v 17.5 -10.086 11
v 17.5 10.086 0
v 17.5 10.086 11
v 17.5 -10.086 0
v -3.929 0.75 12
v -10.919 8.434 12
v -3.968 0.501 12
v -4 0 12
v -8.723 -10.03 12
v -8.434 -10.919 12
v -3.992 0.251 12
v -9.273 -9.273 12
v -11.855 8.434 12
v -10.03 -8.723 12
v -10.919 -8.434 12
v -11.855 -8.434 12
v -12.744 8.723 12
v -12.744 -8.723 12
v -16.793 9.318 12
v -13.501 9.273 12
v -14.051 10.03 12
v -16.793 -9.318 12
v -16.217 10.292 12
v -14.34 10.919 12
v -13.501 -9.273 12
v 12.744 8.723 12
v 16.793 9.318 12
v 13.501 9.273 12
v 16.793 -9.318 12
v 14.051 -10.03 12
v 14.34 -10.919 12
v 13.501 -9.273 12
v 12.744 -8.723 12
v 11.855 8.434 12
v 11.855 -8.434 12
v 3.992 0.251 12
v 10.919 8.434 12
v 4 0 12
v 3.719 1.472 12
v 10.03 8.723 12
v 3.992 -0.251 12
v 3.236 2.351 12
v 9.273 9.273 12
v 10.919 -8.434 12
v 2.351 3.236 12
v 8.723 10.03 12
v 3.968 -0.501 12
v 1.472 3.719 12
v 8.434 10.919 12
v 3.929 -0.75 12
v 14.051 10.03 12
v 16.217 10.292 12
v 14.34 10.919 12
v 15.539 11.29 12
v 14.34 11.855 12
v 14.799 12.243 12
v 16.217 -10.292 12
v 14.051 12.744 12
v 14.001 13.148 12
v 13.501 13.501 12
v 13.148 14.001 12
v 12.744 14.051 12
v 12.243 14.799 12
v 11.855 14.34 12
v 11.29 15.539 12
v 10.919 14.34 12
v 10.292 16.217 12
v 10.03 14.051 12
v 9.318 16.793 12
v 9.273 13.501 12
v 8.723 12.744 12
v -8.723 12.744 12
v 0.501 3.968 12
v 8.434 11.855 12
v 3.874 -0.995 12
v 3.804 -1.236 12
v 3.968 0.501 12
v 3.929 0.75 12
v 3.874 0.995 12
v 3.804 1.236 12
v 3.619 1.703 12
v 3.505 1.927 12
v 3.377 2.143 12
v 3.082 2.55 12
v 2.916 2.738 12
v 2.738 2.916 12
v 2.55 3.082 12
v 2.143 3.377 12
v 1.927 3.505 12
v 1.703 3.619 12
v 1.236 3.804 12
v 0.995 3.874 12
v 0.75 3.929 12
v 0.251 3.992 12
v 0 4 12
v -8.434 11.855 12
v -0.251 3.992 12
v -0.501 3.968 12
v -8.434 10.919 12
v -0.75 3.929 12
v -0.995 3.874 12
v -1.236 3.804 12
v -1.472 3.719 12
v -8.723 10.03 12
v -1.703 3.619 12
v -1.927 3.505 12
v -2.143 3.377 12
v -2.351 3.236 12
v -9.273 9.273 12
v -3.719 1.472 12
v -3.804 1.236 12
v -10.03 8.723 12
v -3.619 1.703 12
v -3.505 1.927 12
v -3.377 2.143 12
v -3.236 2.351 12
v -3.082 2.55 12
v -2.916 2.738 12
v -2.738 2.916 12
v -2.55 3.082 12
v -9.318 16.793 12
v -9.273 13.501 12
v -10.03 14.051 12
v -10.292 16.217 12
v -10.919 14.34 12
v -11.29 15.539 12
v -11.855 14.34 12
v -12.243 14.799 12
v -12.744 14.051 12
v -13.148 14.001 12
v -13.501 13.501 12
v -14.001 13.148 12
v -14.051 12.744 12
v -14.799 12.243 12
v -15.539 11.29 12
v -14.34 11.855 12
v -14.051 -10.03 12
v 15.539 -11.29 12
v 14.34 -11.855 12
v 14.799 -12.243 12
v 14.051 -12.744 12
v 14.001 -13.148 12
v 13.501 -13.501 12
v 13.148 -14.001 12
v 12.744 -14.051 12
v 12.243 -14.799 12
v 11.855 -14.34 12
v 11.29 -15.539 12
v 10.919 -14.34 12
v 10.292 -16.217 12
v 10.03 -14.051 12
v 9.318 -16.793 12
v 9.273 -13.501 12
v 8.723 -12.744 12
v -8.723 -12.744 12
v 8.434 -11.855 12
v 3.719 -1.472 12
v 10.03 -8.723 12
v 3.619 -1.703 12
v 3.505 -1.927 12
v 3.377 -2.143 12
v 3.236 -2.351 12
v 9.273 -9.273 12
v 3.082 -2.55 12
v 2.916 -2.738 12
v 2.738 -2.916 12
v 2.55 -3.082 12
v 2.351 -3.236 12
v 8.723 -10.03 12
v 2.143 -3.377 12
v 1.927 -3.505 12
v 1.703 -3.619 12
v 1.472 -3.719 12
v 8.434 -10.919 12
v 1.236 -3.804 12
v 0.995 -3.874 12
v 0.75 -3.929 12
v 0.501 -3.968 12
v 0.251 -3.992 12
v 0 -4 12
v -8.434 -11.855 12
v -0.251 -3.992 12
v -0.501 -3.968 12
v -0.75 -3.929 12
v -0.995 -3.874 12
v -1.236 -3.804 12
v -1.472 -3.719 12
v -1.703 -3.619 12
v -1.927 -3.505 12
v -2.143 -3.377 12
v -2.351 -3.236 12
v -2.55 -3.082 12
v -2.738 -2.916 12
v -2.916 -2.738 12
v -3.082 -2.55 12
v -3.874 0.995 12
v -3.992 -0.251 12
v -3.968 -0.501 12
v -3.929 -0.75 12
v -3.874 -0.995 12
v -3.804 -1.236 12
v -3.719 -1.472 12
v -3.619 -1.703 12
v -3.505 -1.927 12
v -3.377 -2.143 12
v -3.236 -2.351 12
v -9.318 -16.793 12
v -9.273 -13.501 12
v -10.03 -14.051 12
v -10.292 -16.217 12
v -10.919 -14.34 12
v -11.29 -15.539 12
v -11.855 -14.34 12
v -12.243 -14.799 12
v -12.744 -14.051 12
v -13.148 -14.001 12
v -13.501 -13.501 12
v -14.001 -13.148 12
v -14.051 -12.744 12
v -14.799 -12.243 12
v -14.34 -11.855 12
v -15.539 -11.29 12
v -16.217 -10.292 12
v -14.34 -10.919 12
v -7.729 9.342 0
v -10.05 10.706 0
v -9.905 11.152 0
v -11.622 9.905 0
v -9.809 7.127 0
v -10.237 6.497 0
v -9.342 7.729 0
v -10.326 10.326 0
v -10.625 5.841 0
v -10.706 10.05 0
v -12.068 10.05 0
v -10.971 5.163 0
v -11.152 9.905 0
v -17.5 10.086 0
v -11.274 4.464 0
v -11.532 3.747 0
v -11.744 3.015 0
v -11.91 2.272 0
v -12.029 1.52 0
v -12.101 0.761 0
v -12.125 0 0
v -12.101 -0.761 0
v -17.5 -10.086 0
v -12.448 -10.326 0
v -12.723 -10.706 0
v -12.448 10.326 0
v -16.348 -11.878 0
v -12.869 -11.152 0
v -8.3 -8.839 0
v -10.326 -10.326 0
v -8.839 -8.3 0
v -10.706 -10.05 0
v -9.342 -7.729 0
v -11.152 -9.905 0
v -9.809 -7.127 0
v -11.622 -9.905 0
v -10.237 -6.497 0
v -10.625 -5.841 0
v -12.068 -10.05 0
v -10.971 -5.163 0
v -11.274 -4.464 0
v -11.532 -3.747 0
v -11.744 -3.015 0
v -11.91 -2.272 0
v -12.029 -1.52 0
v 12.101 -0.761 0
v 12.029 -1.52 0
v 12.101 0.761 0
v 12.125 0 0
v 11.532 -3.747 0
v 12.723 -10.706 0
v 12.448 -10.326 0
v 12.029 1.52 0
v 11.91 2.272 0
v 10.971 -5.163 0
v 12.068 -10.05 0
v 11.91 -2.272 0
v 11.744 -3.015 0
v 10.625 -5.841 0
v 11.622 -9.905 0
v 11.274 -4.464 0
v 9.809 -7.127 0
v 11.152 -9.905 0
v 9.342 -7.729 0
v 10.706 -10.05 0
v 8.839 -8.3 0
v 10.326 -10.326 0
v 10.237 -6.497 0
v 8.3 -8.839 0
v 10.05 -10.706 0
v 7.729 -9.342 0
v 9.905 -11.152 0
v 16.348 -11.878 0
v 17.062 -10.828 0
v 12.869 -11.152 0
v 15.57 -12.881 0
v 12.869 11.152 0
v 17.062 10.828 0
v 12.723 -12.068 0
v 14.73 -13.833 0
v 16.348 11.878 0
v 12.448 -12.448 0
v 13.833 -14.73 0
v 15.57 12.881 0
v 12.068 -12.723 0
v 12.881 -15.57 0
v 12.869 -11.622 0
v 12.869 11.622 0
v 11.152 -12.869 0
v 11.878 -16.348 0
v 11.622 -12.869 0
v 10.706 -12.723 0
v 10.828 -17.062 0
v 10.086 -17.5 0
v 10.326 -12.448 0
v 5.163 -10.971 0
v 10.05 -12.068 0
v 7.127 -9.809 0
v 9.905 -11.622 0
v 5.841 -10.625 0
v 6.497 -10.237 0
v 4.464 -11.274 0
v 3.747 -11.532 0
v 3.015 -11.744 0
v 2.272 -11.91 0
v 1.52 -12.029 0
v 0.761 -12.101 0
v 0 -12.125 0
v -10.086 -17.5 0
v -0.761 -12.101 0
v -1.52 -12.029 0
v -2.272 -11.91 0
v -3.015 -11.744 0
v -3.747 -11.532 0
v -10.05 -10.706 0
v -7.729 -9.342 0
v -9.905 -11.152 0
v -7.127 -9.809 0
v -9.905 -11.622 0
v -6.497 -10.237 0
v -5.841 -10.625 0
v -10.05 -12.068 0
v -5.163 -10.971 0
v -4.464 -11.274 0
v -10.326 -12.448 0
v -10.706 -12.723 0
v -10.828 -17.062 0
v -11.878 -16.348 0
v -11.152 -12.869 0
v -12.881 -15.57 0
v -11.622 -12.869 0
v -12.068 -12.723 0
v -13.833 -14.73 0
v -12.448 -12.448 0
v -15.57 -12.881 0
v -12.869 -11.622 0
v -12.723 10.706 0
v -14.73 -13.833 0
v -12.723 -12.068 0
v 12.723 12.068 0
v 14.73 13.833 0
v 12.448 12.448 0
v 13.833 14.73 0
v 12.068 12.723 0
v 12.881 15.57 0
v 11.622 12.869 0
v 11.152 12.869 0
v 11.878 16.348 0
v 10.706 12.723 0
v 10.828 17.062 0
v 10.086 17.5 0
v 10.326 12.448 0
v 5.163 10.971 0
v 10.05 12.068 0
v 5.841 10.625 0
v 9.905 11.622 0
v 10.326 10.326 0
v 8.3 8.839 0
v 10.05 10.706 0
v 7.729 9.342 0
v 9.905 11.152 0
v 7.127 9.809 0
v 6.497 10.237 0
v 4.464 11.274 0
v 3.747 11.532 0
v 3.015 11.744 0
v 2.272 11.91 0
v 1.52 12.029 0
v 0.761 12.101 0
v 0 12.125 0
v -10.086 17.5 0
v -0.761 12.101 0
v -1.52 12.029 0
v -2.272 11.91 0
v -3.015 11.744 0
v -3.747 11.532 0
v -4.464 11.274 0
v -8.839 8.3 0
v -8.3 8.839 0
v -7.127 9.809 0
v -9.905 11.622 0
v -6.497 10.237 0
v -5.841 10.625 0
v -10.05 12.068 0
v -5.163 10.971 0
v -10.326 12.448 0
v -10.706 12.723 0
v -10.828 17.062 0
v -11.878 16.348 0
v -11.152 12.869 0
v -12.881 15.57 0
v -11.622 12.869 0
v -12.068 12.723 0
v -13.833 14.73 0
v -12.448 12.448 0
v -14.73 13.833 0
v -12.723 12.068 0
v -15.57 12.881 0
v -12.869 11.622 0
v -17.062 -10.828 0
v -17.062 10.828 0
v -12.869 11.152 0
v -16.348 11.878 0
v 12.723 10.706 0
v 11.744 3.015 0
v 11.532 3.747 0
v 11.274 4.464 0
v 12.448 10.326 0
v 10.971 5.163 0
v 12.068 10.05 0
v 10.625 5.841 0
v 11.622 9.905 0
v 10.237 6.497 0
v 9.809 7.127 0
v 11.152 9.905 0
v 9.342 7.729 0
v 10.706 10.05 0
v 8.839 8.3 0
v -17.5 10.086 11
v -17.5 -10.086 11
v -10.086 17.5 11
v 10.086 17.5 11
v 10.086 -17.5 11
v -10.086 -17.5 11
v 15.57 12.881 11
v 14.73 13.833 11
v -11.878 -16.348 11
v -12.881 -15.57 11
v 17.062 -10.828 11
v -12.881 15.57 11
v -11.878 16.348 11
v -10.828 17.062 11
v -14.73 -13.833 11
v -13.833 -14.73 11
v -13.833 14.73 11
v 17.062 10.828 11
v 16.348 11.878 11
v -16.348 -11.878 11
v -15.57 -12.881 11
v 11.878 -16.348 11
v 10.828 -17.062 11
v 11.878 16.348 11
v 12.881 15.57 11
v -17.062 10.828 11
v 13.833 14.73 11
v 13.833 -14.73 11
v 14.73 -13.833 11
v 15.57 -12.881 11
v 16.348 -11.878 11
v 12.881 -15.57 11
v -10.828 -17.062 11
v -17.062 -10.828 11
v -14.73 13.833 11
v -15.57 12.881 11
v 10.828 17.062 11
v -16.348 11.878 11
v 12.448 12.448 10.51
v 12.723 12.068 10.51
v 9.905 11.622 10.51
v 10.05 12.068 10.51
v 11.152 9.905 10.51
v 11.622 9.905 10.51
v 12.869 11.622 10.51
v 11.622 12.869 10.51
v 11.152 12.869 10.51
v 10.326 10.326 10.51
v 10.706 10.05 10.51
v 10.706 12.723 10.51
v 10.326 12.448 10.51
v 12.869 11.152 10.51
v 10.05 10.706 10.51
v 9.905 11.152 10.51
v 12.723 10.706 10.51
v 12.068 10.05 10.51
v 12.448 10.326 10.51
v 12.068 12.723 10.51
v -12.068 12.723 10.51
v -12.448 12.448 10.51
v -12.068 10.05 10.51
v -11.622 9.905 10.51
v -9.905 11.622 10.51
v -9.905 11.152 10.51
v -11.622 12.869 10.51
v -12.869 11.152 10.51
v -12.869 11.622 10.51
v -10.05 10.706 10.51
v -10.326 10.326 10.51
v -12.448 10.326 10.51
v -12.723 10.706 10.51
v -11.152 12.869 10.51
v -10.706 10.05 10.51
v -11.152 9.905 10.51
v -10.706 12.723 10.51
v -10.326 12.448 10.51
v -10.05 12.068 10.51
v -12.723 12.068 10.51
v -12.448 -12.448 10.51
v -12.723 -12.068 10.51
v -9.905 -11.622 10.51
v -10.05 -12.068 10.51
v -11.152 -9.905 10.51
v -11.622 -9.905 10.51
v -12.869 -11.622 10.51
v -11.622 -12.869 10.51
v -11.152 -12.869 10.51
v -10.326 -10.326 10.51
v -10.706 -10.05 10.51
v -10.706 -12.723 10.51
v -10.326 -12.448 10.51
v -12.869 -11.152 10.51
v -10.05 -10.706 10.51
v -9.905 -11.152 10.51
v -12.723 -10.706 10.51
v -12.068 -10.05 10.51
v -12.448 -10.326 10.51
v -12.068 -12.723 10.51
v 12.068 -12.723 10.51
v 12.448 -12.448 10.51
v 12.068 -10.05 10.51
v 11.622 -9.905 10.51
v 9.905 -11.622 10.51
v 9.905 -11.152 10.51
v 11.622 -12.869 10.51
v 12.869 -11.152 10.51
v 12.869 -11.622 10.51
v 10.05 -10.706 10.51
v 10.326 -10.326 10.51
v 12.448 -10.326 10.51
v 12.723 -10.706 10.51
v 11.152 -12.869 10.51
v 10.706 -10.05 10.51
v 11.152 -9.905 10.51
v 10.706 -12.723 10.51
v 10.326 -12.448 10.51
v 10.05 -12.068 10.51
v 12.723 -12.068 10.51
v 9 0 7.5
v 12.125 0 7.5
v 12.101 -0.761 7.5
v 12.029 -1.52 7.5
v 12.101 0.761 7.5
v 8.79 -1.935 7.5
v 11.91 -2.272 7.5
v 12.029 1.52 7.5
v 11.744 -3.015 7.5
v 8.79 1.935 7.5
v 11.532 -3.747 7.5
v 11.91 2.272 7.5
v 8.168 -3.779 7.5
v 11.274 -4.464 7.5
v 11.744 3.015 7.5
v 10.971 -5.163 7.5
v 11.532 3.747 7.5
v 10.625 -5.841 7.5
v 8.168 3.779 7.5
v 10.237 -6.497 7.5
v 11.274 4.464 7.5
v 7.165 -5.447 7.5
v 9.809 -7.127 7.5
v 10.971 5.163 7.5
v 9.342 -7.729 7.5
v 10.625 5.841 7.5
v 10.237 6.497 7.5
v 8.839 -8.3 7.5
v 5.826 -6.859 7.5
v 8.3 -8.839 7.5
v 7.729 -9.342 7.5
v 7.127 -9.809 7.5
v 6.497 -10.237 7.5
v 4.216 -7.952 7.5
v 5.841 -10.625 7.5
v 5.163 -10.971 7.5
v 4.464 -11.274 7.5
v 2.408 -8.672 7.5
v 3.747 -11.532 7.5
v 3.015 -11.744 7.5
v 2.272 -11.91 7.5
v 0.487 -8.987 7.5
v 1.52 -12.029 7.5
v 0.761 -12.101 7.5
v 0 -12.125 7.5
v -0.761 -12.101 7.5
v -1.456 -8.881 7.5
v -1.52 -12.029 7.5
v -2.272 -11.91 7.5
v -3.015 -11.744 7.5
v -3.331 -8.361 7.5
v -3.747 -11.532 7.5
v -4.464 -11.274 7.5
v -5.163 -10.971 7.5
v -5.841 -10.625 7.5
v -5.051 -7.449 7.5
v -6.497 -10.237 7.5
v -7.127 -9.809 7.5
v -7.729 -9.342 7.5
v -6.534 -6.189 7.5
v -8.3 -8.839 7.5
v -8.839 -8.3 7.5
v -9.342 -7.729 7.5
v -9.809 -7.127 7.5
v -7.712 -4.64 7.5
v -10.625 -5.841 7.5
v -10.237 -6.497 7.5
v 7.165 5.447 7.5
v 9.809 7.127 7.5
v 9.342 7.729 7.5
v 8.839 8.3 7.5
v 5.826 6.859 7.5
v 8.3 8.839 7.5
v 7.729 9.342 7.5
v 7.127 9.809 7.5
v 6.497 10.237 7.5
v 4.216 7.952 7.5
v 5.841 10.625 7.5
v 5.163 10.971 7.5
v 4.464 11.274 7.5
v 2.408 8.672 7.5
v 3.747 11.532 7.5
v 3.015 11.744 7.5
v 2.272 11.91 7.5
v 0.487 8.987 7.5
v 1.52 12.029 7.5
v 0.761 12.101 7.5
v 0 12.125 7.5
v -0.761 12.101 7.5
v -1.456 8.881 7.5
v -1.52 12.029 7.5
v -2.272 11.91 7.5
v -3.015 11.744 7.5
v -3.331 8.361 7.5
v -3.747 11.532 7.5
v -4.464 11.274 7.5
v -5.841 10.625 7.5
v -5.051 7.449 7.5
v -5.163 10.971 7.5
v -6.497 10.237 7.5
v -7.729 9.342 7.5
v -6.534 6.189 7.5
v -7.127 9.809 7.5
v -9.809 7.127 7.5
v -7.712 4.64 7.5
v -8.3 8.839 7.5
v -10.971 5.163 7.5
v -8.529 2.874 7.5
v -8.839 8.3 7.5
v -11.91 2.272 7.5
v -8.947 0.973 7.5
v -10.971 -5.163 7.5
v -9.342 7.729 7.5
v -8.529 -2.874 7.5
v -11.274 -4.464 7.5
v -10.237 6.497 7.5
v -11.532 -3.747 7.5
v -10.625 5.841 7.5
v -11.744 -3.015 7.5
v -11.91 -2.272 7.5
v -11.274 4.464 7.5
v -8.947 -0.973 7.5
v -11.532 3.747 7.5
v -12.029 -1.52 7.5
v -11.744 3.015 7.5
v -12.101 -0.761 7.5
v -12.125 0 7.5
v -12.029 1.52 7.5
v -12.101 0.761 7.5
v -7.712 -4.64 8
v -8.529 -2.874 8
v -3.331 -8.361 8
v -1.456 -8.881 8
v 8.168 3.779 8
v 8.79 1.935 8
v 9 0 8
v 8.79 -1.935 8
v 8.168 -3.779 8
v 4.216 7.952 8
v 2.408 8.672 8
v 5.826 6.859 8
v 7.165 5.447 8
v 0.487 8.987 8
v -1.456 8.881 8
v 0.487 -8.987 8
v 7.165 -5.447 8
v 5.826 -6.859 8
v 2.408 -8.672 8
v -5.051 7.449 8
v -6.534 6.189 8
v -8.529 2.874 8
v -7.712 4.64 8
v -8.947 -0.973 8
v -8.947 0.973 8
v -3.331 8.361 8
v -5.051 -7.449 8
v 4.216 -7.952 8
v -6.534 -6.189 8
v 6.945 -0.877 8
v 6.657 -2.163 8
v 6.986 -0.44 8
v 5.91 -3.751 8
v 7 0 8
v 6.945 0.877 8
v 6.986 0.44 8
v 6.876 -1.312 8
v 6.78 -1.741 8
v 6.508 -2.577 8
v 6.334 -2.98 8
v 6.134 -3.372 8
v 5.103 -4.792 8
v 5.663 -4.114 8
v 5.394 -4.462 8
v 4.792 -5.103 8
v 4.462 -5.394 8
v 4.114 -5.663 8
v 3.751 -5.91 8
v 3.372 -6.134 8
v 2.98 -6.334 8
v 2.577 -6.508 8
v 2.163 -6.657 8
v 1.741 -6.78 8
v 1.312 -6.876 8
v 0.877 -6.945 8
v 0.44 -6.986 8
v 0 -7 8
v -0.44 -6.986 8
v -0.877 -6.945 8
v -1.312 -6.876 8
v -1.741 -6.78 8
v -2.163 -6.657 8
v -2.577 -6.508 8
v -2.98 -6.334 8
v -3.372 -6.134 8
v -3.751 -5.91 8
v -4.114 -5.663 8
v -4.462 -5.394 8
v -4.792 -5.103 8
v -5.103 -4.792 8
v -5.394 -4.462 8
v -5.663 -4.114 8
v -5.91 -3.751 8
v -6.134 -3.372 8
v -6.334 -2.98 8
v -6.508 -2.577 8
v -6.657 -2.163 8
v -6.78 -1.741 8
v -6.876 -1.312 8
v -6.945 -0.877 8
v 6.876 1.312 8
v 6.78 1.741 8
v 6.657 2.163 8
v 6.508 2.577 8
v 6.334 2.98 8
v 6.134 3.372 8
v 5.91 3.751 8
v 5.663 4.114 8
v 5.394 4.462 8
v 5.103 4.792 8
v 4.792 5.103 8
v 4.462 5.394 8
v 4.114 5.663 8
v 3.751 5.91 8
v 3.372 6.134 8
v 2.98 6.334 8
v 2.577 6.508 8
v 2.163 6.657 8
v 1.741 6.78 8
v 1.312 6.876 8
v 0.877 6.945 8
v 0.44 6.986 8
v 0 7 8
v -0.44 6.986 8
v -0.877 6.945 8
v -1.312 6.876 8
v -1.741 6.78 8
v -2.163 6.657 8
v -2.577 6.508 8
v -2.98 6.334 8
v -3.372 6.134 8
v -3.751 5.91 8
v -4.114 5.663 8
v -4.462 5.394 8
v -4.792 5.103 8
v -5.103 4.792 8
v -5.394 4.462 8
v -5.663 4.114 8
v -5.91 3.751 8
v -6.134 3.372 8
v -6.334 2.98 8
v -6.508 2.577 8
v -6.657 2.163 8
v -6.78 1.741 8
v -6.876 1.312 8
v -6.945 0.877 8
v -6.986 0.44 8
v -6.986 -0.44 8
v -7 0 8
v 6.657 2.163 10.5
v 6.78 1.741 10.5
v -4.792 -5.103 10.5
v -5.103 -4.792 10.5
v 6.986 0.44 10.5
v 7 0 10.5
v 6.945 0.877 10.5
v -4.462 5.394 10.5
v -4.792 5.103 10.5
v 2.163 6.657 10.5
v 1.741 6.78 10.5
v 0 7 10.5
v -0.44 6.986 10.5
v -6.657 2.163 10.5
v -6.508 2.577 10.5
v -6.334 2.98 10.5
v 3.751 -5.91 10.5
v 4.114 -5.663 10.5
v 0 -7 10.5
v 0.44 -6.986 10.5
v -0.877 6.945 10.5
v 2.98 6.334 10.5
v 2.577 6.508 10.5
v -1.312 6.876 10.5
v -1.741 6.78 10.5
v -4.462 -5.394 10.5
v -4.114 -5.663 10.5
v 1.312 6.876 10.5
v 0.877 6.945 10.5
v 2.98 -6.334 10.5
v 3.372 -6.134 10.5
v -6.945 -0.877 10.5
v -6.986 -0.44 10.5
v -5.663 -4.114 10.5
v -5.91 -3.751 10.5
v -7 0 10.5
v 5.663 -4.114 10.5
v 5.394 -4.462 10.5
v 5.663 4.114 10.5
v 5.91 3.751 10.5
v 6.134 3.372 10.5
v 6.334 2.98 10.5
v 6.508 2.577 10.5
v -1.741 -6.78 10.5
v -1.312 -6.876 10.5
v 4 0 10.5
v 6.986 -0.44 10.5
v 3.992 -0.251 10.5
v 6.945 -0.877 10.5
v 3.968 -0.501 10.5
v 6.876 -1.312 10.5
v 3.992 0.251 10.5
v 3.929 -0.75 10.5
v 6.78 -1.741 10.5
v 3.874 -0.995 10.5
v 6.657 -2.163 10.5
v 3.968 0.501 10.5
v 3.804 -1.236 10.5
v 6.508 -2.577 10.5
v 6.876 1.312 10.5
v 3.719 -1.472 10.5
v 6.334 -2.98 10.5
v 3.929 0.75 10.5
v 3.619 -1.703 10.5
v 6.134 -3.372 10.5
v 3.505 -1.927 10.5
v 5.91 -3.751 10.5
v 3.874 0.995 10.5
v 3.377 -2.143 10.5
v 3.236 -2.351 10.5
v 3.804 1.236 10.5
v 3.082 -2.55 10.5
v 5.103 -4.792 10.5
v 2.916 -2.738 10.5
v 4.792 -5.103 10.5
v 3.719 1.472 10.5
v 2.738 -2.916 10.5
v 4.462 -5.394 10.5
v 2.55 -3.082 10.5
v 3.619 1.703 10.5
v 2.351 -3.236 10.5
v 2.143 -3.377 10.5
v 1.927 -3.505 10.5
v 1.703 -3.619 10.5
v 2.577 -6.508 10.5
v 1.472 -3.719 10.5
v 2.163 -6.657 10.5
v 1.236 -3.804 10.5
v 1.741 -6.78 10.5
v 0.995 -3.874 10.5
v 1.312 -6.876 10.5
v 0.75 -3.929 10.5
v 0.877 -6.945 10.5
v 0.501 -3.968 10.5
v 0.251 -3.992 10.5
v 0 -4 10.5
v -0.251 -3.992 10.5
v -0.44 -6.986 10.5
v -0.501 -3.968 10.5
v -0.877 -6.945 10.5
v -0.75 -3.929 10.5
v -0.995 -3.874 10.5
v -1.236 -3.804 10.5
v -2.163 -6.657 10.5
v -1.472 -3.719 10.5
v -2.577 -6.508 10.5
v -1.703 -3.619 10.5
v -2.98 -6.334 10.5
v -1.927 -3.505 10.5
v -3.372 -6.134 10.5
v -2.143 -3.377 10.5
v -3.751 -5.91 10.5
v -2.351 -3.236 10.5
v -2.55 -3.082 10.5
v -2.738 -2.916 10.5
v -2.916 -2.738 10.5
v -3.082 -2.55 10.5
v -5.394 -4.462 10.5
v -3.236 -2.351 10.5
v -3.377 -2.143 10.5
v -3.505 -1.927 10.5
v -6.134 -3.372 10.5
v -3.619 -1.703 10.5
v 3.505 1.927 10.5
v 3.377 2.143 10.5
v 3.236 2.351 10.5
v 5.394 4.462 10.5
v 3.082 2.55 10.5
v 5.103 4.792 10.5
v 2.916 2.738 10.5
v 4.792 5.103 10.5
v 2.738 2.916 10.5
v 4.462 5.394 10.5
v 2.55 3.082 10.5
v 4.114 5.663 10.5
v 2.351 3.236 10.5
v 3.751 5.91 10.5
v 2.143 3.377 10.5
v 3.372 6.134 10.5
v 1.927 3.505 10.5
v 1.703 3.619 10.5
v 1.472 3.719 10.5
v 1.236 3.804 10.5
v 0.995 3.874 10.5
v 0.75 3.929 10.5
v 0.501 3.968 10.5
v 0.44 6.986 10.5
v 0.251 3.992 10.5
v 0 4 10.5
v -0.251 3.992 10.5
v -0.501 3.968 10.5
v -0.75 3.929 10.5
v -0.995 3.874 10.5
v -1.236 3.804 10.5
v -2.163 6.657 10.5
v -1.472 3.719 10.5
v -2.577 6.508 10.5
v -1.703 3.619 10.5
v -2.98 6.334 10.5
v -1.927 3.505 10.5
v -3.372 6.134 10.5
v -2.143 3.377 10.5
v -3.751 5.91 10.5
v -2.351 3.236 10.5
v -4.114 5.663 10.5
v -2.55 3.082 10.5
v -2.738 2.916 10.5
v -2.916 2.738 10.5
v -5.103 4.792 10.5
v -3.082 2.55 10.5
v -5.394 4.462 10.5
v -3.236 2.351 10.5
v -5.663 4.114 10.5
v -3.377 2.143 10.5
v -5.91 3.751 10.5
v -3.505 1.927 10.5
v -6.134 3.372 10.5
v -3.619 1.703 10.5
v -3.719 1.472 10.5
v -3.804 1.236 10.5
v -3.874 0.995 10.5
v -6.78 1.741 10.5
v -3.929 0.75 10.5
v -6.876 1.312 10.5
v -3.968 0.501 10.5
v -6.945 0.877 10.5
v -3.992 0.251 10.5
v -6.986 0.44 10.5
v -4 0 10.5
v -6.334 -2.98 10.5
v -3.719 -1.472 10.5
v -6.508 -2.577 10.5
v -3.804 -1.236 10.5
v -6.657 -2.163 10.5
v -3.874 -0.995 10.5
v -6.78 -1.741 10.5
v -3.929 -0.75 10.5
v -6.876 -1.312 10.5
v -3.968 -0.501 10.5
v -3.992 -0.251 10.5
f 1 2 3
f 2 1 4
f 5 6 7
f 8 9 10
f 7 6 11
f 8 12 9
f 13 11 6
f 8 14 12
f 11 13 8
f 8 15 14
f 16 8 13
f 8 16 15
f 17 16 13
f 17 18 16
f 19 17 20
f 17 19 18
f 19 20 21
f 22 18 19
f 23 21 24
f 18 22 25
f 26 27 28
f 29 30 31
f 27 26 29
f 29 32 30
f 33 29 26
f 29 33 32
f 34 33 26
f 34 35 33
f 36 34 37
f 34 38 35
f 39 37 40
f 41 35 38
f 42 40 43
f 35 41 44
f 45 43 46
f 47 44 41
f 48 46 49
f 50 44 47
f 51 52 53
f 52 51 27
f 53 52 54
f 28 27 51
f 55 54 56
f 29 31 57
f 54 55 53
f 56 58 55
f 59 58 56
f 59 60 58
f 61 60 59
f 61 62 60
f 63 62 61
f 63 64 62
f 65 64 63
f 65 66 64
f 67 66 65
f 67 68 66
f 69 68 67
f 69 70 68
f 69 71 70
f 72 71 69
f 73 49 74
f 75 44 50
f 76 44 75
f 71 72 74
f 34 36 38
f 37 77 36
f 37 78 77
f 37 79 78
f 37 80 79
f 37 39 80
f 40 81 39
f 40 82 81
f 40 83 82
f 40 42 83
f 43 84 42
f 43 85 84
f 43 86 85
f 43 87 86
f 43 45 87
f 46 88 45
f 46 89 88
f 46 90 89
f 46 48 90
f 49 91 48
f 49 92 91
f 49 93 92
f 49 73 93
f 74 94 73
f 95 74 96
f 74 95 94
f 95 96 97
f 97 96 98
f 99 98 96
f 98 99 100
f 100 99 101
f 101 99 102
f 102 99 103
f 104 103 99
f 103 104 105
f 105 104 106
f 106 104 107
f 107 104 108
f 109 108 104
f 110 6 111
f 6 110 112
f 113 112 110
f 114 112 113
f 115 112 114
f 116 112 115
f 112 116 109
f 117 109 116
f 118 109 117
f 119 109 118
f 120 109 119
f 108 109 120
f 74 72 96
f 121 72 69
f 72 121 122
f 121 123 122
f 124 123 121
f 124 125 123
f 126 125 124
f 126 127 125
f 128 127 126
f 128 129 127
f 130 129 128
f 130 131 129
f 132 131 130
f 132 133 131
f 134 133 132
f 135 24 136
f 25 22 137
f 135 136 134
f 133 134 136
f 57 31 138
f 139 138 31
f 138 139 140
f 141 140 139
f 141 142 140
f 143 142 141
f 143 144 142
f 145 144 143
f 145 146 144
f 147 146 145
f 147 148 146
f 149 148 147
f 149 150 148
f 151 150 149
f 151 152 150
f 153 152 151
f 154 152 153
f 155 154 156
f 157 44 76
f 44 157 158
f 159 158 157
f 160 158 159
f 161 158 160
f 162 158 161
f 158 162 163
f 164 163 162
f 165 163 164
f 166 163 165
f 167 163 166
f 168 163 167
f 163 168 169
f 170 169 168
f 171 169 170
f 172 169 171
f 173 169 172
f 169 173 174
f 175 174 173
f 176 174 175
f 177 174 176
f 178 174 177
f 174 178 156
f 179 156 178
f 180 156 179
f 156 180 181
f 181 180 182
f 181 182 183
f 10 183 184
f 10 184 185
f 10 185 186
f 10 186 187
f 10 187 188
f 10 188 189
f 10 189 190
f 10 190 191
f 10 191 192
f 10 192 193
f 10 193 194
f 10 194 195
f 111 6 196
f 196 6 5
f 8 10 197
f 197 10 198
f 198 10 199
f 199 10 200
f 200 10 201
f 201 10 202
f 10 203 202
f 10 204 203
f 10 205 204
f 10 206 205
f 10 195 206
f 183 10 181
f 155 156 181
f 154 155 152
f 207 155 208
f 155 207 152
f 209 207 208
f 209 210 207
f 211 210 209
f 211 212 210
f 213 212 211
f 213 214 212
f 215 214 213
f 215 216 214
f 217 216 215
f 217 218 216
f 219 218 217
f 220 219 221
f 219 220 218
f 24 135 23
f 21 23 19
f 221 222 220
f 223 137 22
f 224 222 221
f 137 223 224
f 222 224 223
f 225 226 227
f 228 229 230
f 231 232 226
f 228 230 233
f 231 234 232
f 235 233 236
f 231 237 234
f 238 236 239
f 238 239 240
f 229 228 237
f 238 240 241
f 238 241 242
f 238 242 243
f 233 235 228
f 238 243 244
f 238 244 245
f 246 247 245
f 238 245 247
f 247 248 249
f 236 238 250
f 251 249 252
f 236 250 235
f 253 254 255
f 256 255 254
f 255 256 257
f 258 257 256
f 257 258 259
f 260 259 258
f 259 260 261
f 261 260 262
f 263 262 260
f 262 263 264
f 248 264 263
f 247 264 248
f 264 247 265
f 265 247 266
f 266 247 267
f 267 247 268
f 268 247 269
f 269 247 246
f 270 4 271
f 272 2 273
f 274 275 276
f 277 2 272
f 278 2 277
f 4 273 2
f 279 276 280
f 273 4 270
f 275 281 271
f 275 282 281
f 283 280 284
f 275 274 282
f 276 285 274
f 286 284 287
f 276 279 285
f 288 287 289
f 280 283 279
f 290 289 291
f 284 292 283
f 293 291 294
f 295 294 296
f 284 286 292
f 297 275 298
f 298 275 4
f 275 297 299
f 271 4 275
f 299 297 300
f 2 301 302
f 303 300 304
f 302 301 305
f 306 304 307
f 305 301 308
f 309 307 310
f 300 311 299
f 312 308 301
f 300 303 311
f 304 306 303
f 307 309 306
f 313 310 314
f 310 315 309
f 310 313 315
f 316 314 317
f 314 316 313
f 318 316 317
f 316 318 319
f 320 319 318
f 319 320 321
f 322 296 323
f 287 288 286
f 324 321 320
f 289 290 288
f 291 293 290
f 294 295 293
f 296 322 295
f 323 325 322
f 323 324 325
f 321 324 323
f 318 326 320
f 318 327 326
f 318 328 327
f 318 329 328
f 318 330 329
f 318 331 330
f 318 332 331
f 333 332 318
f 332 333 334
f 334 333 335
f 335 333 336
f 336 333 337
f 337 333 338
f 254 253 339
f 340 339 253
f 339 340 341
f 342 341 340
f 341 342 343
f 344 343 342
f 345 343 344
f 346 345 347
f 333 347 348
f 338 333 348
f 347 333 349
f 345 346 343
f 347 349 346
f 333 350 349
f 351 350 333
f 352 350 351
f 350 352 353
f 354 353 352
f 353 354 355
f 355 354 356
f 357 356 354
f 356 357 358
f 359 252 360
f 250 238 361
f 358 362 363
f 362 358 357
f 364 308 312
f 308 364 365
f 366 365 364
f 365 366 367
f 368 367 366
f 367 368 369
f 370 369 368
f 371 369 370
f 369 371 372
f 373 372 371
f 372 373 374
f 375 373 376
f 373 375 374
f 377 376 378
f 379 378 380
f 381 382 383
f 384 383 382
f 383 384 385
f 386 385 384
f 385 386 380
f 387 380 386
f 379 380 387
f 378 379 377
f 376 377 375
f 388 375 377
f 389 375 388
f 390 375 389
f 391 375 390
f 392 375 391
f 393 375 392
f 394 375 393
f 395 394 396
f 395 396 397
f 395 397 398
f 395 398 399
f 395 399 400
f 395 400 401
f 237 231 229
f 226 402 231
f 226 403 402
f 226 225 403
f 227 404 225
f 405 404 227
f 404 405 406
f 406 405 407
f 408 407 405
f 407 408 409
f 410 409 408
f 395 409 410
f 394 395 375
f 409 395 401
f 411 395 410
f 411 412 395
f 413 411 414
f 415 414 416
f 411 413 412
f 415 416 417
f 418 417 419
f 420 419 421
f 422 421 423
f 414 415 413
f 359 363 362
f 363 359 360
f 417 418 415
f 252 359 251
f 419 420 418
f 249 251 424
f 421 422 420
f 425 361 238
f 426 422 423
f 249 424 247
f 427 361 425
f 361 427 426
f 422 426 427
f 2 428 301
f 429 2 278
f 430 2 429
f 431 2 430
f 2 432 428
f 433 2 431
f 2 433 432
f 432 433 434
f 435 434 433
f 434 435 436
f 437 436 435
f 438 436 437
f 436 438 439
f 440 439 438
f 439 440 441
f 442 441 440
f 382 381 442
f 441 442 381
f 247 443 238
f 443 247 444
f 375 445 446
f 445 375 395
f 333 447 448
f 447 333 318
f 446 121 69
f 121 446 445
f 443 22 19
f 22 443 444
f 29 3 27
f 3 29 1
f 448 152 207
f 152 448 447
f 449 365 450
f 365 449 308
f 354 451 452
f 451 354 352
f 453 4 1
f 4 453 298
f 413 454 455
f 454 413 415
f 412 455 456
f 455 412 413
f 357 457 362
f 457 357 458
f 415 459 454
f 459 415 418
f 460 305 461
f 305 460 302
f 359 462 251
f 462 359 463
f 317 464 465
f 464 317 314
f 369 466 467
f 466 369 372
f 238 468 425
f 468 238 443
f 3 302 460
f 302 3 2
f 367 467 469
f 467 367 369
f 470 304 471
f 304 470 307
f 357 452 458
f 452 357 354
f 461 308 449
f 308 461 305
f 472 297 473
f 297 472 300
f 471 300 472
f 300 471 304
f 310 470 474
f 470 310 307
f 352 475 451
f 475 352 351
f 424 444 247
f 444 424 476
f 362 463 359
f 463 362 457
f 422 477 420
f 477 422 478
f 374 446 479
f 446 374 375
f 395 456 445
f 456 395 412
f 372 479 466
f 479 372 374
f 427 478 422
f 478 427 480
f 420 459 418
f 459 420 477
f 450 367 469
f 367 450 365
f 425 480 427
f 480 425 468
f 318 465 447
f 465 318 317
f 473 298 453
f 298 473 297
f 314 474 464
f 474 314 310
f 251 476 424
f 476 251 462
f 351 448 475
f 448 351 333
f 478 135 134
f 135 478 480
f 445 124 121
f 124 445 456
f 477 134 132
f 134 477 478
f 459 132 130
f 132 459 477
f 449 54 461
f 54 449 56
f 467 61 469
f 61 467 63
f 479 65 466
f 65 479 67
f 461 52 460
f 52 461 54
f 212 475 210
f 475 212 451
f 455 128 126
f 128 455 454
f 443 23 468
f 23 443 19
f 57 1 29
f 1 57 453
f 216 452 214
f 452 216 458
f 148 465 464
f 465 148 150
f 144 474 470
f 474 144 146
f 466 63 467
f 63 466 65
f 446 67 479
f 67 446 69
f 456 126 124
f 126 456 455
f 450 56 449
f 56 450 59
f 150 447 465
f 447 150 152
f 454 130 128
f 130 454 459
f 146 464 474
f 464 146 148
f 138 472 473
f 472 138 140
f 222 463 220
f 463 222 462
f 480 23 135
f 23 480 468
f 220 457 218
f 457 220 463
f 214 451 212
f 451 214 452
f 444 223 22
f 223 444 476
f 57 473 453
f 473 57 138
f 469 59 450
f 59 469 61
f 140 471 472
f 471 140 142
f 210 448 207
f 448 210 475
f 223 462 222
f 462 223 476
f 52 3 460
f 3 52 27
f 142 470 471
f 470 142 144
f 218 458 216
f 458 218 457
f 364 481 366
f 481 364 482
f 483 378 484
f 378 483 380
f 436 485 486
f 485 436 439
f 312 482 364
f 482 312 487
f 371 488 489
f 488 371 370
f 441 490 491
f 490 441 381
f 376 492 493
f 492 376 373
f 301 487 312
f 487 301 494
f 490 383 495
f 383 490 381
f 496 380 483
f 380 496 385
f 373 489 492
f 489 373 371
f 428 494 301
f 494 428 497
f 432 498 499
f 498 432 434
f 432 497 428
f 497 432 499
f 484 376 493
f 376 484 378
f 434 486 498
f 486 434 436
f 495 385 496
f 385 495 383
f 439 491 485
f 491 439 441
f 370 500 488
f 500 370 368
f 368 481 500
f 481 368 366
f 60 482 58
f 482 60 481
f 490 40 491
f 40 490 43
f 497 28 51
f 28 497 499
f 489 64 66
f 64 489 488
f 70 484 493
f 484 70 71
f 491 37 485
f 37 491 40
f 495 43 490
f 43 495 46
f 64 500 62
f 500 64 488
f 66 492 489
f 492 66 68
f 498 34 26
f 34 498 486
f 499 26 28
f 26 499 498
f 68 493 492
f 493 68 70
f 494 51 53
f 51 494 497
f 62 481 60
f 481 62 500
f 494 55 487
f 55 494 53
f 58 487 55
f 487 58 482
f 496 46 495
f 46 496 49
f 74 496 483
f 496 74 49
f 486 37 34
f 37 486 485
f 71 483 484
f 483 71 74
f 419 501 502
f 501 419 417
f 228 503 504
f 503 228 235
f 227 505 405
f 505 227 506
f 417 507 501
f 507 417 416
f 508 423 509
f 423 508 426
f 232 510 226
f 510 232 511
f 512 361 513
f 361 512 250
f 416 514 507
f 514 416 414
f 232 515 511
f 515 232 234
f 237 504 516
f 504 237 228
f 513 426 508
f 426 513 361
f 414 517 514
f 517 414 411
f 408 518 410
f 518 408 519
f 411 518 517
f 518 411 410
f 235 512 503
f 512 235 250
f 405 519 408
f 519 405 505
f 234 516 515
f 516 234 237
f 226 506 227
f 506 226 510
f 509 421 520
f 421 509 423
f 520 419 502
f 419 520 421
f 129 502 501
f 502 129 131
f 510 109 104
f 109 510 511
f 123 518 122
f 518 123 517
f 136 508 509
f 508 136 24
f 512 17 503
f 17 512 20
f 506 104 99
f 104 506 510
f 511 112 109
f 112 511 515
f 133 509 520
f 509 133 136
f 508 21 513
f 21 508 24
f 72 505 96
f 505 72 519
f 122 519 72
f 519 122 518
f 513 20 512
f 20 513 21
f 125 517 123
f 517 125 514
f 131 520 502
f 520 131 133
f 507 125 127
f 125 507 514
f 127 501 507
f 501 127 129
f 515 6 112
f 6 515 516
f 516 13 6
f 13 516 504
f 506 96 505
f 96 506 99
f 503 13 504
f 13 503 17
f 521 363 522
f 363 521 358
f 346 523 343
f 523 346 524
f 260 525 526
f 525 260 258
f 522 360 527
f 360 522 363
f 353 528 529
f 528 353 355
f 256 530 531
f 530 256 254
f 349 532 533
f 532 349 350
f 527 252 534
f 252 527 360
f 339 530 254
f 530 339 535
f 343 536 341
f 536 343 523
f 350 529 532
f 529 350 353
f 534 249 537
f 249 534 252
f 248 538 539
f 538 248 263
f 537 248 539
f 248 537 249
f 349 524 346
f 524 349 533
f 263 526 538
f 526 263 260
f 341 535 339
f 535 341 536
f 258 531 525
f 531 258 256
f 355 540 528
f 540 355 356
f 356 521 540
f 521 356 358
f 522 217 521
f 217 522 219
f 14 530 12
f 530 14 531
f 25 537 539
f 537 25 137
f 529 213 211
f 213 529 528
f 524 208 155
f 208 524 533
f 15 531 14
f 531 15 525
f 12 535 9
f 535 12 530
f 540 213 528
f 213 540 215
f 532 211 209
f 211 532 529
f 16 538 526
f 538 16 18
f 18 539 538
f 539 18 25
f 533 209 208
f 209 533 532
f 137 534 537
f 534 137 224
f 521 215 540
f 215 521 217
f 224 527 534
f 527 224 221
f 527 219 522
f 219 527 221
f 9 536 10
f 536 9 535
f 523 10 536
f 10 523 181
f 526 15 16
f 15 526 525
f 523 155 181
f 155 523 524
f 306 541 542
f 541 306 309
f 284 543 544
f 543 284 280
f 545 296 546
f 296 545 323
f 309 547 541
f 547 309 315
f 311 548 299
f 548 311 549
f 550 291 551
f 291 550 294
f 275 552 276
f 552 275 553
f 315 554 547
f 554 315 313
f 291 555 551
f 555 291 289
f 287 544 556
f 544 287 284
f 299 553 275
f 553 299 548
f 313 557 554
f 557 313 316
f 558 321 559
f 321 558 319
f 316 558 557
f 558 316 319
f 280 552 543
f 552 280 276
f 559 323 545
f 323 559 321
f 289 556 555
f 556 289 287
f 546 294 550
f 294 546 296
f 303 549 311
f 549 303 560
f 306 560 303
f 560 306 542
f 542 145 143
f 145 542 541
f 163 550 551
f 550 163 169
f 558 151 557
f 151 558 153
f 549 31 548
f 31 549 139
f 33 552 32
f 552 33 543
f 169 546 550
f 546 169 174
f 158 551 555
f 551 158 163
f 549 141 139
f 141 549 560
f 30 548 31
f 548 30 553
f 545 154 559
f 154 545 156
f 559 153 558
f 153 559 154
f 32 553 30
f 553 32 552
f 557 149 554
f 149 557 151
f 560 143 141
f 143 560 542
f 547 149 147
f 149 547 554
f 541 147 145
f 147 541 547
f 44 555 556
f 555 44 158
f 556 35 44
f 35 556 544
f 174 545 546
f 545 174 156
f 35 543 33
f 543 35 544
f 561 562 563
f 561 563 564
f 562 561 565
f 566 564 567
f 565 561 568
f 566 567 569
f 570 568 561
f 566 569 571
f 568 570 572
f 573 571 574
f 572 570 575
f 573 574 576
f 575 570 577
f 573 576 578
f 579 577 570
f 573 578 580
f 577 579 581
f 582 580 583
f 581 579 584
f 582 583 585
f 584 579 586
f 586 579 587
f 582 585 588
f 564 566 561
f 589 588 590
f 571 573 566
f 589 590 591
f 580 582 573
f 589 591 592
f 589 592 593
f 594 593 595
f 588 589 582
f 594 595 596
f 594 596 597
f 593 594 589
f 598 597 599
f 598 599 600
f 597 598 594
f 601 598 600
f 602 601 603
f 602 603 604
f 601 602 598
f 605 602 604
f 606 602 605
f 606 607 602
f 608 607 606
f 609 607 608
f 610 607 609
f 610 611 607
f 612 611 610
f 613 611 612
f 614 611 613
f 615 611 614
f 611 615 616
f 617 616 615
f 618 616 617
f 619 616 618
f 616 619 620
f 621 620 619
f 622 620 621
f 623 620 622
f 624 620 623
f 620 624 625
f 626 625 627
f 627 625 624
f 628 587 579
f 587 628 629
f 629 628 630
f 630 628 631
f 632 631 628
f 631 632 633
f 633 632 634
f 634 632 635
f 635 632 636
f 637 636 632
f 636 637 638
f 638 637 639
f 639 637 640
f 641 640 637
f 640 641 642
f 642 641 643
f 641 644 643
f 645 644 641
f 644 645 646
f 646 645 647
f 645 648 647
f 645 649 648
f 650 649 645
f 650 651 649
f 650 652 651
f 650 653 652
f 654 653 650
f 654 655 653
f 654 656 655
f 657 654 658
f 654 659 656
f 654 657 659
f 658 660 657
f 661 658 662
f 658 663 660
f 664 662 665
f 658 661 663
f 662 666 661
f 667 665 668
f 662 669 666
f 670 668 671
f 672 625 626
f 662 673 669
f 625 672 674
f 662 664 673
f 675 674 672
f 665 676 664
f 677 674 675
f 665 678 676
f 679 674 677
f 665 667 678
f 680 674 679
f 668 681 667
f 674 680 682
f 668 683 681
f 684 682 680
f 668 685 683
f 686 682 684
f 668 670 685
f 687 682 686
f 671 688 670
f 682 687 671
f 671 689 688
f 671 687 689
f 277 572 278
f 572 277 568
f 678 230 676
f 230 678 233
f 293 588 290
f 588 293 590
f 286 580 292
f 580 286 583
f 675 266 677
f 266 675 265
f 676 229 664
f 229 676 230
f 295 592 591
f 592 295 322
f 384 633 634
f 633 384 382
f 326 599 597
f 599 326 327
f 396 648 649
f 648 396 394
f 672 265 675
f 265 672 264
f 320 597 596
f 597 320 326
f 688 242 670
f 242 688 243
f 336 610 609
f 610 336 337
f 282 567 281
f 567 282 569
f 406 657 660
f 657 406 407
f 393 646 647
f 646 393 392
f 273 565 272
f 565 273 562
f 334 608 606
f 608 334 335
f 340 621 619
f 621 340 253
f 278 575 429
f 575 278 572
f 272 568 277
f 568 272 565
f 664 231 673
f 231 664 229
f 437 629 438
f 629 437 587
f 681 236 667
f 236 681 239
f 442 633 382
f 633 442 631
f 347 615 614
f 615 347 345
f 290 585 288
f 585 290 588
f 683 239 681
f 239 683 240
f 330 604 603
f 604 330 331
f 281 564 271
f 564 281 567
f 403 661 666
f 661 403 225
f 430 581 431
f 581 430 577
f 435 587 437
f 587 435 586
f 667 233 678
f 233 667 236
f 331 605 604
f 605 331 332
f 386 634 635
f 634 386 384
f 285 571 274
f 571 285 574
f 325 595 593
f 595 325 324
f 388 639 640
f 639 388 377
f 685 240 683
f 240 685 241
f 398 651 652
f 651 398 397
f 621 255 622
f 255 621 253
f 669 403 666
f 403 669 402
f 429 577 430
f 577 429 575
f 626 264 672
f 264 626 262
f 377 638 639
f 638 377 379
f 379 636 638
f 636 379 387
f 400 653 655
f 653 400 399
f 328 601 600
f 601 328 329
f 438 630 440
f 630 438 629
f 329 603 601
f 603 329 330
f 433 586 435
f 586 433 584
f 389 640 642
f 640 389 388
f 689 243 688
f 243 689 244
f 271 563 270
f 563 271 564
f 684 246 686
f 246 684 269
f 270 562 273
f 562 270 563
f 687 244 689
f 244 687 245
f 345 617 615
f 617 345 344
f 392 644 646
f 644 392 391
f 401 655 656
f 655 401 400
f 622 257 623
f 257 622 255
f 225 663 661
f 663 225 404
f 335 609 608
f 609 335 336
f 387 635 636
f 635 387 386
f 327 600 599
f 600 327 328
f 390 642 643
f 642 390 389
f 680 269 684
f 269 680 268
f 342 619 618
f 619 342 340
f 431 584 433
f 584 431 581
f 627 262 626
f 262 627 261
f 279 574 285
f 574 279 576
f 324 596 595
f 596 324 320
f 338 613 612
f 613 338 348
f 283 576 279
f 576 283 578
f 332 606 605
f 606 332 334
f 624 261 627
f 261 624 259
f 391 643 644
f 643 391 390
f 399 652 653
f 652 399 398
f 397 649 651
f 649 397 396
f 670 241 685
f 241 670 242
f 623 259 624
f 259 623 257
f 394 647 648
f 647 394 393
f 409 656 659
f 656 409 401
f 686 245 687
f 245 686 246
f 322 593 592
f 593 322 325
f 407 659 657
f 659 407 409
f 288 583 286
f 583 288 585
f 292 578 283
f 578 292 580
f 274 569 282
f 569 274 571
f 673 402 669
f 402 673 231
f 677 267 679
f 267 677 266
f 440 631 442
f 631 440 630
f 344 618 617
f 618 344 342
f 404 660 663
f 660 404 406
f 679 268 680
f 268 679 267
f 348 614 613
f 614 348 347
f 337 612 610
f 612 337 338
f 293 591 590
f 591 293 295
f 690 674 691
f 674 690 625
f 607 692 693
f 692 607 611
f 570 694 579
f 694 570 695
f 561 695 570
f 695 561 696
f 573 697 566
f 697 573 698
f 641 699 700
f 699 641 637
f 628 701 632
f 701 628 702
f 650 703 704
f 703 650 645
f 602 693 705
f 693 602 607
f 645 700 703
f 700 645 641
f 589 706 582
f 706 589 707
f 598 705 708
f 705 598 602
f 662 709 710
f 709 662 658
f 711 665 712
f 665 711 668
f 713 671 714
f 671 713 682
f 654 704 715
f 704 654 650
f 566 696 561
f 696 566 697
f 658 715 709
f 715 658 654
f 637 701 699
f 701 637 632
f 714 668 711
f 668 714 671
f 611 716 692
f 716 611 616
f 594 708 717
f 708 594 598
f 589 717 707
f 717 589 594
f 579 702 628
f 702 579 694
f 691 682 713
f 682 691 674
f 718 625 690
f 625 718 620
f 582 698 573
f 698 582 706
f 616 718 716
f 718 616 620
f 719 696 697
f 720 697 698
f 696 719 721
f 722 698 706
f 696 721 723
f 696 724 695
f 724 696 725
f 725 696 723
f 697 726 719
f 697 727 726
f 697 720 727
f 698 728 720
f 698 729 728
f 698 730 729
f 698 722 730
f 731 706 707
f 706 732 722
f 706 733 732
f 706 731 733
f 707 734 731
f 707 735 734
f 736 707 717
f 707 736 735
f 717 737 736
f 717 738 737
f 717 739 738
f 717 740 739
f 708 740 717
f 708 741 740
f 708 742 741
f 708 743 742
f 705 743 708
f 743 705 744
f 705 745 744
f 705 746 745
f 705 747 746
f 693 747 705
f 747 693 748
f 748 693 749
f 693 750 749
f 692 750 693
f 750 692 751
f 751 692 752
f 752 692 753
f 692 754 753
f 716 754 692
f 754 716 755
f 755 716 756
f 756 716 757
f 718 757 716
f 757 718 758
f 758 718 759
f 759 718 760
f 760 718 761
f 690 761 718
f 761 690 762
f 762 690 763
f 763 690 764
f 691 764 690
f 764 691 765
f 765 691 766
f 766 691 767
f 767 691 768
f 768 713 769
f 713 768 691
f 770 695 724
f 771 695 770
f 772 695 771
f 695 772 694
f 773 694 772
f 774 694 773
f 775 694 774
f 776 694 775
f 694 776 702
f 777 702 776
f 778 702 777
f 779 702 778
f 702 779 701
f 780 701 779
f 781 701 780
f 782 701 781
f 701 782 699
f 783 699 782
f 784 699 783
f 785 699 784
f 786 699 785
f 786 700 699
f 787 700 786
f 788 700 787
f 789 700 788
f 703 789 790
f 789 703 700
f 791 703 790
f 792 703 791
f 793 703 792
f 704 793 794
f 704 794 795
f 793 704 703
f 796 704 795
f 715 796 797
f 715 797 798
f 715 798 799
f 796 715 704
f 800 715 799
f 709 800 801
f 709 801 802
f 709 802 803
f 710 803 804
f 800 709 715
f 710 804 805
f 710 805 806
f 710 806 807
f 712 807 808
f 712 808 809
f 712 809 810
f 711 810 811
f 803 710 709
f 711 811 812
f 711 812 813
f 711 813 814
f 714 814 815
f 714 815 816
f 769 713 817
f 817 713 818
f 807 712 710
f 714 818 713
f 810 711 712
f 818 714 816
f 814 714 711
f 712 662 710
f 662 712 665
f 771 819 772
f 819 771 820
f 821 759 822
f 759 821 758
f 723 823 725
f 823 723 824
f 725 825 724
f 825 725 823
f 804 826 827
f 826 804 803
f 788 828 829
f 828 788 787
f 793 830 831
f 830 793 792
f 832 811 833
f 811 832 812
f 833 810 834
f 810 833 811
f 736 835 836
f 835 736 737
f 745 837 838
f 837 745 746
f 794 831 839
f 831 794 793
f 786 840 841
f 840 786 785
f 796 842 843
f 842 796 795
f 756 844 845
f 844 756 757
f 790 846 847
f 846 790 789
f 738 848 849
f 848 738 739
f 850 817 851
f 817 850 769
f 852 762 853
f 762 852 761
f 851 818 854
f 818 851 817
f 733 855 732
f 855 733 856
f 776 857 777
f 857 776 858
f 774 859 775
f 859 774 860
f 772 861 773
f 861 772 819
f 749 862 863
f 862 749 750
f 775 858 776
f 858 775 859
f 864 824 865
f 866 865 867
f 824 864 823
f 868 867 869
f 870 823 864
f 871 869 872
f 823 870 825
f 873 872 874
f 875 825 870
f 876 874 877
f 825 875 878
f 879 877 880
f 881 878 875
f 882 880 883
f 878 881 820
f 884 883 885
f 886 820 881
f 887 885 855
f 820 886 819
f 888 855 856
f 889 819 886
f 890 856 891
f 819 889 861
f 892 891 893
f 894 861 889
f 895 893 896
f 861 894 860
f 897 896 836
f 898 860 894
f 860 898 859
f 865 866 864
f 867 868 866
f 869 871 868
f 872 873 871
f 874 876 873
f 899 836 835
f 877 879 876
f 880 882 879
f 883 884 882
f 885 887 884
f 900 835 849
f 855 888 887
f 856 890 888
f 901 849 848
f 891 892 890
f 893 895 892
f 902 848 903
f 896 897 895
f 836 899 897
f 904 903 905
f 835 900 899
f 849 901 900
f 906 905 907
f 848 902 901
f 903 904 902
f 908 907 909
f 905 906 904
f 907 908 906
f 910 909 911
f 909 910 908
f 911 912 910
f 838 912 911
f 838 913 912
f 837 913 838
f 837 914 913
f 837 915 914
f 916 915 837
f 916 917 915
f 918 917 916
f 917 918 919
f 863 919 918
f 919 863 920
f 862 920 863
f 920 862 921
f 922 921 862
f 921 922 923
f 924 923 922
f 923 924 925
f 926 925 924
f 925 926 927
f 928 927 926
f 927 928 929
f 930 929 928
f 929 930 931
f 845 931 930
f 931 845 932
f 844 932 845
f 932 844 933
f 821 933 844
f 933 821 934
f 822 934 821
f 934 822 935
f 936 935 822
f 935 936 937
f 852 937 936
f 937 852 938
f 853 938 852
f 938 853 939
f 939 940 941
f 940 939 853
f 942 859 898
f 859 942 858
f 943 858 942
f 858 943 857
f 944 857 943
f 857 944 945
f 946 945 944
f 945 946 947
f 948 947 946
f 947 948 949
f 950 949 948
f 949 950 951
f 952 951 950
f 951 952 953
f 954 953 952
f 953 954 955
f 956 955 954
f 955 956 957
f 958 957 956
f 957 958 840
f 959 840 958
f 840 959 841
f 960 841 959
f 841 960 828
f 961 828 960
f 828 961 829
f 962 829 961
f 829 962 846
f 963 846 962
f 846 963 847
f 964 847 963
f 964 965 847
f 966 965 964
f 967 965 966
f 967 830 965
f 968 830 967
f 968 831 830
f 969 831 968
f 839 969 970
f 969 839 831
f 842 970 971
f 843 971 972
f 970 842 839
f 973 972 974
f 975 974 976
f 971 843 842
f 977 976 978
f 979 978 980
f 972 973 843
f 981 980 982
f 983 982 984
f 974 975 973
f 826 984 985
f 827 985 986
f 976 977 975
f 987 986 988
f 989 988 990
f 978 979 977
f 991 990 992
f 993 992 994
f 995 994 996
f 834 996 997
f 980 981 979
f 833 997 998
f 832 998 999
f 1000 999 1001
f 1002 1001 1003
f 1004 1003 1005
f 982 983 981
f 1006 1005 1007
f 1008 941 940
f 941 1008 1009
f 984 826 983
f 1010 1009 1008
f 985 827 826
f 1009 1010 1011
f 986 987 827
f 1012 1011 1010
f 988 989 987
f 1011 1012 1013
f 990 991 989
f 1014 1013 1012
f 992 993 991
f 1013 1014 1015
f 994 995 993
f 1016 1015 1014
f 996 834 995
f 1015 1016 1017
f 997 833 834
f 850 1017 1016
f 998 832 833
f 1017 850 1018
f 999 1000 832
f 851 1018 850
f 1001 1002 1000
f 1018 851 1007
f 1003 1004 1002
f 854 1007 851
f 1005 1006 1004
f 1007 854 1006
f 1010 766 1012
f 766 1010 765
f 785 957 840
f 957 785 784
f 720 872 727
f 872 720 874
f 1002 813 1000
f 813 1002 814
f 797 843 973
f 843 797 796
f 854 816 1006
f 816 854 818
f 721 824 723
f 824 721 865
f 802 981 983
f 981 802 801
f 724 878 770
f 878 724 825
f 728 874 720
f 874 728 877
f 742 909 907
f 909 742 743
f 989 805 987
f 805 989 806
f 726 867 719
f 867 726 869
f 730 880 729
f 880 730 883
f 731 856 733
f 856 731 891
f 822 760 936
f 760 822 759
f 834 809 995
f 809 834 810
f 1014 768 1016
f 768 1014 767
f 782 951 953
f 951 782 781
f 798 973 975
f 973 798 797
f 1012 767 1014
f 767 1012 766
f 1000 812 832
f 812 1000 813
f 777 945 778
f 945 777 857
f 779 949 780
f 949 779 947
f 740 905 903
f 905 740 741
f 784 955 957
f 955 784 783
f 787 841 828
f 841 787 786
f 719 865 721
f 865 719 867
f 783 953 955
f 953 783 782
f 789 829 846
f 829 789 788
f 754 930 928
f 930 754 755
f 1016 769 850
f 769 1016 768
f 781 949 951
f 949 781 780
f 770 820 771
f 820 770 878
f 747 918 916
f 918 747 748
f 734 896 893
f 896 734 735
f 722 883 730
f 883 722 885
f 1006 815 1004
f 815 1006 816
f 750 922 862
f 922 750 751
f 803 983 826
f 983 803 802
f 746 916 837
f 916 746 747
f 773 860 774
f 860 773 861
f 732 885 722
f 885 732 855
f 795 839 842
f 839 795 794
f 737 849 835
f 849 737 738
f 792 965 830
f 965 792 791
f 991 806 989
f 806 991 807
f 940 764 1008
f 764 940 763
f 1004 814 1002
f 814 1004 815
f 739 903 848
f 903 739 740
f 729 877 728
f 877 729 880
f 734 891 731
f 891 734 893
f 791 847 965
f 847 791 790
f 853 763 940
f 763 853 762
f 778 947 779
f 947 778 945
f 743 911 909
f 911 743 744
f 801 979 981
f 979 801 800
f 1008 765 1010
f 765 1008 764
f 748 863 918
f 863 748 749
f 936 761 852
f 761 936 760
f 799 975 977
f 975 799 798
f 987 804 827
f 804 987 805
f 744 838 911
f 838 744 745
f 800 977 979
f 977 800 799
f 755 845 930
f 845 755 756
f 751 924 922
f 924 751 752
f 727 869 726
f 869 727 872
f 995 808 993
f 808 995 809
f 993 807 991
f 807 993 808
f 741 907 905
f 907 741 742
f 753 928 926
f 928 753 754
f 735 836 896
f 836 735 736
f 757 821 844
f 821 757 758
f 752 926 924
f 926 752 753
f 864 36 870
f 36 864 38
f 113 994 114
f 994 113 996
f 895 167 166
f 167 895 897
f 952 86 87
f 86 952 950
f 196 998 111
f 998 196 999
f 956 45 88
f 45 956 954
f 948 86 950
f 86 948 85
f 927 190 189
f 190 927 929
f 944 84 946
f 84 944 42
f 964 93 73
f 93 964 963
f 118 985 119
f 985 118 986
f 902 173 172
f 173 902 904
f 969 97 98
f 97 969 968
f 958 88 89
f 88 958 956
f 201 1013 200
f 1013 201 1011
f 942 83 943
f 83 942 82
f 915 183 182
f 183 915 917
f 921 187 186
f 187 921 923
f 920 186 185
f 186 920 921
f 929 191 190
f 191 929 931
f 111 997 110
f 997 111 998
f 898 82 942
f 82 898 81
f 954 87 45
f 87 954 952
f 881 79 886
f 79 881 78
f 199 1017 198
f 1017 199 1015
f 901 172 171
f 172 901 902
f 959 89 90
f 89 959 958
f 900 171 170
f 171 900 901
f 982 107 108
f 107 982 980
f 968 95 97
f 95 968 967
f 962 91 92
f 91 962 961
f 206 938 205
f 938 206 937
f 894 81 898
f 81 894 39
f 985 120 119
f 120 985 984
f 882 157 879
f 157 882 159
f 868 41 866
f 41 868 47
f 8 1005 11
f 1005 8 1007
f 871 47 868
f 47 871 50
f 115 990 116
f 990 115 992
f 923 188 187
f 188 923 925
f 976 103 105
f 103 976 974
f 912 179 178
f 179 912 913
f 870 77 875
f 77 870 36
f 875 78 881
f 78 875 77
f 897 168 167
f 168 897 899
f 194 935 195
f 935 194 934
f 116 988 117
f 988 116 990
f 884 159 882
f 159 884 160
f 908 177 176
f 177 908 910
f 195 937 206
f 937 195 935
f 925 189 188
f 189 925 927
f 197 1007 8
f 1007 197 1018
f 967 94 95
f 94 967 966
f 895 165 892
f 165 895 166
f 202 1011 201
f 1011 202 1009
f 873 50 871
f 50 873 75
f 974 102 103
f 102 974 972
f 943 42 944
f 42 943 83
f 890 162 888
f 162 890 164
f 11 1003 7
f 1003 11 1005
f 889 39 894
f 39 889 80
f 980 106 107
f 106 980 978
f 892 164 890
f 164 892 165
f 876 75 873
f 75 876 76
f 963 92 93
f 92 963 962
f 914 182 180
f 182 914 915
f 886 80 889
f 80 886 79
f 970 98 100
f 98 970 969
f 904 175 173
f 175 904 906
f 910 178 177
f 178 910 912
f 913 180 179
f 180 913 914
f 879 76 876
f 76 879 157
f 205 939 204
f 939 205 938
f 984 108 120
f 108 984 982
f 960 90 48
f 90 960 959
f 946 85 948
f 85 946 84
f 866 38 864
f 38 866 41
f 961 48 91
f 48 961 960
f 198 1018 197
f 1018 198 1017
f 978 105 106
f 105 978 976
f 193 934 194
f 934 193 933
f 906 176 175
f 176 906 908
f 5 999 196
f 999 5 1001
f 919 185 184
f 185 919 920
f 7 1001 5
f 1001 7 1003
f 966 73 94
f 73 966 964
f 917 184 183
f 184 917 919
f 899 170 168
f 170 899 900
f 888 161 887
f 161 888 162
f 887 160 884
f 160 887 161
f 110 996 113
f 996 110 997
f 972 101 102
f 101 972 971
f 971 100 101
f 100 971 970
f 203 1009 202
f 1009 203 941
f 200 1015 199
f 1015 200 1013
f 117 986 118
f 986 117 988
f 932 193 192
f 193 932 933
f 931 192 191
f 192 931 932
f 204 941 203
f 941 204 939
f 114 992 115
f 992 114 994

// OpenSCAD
//
// housing.scad -- ball bearing housing for the tracker
//
// (c) 2015 Prof Dr Andreas Mueller, Hochschule Rapperswil
//
l = 35;
l1 = l * 2 / sqrt(3);
l2 = l * sqrt(2);
h = 12;
d = 1;
gap = 0.125;

with_spacer = 0;

difference() {
	intersection() {
		translate([-l/2, -l/2, 0]) cube([l, l, h]);
		rotate([0, 0, 45])
		cylinder(r1 = l2/2 + h - d, r2 = 0, h = l2/2 + h - d, $fn = 4); 
		cylinder(r = l1/2, h = h, $fn = 100);
		cylinder(r1 = l1/2 + h - d, r2 = 0, h = l1/2 + h - d, $fn = 100);
	}
	union() {
		translate([0, 0, 7.5 - h])
			cylinder(r = 12 + gap, h = h, $fn = 100);
		translate([0, 0, 8 - h])
			cylinder(r = 9, h = h);
		translate([0, 0, 10.5 - h])
			cylinder(r = 7, h = h, $fn = 100);
		translate([0, 0, 1])
			cylinder(r = 4, h = h, $fn = 100);
		for (alpha = [ 45 : 90 : 315 ]) {
			rotate([0, 0, alpha])
				translate([(12 + l1/2) / 2, 0, h + 0.01])
					rotate([180, 0, 0])
					union() {
						cylinder(r = 1.5, h = h + 1, $fn = 20);
						cylinder(r1 = 3, r2 = 0, h = 3, $fn = 20);
					}
		}
	}
}

if (with_spacer) {
	translate([30, 0, h - 0.5])
	difference() {
			cylinder(r = 11.5, h = 0.5);
			translate([0, 0, -0.25])
				cylinder(r = 9, h = 1);
	}
}
	
